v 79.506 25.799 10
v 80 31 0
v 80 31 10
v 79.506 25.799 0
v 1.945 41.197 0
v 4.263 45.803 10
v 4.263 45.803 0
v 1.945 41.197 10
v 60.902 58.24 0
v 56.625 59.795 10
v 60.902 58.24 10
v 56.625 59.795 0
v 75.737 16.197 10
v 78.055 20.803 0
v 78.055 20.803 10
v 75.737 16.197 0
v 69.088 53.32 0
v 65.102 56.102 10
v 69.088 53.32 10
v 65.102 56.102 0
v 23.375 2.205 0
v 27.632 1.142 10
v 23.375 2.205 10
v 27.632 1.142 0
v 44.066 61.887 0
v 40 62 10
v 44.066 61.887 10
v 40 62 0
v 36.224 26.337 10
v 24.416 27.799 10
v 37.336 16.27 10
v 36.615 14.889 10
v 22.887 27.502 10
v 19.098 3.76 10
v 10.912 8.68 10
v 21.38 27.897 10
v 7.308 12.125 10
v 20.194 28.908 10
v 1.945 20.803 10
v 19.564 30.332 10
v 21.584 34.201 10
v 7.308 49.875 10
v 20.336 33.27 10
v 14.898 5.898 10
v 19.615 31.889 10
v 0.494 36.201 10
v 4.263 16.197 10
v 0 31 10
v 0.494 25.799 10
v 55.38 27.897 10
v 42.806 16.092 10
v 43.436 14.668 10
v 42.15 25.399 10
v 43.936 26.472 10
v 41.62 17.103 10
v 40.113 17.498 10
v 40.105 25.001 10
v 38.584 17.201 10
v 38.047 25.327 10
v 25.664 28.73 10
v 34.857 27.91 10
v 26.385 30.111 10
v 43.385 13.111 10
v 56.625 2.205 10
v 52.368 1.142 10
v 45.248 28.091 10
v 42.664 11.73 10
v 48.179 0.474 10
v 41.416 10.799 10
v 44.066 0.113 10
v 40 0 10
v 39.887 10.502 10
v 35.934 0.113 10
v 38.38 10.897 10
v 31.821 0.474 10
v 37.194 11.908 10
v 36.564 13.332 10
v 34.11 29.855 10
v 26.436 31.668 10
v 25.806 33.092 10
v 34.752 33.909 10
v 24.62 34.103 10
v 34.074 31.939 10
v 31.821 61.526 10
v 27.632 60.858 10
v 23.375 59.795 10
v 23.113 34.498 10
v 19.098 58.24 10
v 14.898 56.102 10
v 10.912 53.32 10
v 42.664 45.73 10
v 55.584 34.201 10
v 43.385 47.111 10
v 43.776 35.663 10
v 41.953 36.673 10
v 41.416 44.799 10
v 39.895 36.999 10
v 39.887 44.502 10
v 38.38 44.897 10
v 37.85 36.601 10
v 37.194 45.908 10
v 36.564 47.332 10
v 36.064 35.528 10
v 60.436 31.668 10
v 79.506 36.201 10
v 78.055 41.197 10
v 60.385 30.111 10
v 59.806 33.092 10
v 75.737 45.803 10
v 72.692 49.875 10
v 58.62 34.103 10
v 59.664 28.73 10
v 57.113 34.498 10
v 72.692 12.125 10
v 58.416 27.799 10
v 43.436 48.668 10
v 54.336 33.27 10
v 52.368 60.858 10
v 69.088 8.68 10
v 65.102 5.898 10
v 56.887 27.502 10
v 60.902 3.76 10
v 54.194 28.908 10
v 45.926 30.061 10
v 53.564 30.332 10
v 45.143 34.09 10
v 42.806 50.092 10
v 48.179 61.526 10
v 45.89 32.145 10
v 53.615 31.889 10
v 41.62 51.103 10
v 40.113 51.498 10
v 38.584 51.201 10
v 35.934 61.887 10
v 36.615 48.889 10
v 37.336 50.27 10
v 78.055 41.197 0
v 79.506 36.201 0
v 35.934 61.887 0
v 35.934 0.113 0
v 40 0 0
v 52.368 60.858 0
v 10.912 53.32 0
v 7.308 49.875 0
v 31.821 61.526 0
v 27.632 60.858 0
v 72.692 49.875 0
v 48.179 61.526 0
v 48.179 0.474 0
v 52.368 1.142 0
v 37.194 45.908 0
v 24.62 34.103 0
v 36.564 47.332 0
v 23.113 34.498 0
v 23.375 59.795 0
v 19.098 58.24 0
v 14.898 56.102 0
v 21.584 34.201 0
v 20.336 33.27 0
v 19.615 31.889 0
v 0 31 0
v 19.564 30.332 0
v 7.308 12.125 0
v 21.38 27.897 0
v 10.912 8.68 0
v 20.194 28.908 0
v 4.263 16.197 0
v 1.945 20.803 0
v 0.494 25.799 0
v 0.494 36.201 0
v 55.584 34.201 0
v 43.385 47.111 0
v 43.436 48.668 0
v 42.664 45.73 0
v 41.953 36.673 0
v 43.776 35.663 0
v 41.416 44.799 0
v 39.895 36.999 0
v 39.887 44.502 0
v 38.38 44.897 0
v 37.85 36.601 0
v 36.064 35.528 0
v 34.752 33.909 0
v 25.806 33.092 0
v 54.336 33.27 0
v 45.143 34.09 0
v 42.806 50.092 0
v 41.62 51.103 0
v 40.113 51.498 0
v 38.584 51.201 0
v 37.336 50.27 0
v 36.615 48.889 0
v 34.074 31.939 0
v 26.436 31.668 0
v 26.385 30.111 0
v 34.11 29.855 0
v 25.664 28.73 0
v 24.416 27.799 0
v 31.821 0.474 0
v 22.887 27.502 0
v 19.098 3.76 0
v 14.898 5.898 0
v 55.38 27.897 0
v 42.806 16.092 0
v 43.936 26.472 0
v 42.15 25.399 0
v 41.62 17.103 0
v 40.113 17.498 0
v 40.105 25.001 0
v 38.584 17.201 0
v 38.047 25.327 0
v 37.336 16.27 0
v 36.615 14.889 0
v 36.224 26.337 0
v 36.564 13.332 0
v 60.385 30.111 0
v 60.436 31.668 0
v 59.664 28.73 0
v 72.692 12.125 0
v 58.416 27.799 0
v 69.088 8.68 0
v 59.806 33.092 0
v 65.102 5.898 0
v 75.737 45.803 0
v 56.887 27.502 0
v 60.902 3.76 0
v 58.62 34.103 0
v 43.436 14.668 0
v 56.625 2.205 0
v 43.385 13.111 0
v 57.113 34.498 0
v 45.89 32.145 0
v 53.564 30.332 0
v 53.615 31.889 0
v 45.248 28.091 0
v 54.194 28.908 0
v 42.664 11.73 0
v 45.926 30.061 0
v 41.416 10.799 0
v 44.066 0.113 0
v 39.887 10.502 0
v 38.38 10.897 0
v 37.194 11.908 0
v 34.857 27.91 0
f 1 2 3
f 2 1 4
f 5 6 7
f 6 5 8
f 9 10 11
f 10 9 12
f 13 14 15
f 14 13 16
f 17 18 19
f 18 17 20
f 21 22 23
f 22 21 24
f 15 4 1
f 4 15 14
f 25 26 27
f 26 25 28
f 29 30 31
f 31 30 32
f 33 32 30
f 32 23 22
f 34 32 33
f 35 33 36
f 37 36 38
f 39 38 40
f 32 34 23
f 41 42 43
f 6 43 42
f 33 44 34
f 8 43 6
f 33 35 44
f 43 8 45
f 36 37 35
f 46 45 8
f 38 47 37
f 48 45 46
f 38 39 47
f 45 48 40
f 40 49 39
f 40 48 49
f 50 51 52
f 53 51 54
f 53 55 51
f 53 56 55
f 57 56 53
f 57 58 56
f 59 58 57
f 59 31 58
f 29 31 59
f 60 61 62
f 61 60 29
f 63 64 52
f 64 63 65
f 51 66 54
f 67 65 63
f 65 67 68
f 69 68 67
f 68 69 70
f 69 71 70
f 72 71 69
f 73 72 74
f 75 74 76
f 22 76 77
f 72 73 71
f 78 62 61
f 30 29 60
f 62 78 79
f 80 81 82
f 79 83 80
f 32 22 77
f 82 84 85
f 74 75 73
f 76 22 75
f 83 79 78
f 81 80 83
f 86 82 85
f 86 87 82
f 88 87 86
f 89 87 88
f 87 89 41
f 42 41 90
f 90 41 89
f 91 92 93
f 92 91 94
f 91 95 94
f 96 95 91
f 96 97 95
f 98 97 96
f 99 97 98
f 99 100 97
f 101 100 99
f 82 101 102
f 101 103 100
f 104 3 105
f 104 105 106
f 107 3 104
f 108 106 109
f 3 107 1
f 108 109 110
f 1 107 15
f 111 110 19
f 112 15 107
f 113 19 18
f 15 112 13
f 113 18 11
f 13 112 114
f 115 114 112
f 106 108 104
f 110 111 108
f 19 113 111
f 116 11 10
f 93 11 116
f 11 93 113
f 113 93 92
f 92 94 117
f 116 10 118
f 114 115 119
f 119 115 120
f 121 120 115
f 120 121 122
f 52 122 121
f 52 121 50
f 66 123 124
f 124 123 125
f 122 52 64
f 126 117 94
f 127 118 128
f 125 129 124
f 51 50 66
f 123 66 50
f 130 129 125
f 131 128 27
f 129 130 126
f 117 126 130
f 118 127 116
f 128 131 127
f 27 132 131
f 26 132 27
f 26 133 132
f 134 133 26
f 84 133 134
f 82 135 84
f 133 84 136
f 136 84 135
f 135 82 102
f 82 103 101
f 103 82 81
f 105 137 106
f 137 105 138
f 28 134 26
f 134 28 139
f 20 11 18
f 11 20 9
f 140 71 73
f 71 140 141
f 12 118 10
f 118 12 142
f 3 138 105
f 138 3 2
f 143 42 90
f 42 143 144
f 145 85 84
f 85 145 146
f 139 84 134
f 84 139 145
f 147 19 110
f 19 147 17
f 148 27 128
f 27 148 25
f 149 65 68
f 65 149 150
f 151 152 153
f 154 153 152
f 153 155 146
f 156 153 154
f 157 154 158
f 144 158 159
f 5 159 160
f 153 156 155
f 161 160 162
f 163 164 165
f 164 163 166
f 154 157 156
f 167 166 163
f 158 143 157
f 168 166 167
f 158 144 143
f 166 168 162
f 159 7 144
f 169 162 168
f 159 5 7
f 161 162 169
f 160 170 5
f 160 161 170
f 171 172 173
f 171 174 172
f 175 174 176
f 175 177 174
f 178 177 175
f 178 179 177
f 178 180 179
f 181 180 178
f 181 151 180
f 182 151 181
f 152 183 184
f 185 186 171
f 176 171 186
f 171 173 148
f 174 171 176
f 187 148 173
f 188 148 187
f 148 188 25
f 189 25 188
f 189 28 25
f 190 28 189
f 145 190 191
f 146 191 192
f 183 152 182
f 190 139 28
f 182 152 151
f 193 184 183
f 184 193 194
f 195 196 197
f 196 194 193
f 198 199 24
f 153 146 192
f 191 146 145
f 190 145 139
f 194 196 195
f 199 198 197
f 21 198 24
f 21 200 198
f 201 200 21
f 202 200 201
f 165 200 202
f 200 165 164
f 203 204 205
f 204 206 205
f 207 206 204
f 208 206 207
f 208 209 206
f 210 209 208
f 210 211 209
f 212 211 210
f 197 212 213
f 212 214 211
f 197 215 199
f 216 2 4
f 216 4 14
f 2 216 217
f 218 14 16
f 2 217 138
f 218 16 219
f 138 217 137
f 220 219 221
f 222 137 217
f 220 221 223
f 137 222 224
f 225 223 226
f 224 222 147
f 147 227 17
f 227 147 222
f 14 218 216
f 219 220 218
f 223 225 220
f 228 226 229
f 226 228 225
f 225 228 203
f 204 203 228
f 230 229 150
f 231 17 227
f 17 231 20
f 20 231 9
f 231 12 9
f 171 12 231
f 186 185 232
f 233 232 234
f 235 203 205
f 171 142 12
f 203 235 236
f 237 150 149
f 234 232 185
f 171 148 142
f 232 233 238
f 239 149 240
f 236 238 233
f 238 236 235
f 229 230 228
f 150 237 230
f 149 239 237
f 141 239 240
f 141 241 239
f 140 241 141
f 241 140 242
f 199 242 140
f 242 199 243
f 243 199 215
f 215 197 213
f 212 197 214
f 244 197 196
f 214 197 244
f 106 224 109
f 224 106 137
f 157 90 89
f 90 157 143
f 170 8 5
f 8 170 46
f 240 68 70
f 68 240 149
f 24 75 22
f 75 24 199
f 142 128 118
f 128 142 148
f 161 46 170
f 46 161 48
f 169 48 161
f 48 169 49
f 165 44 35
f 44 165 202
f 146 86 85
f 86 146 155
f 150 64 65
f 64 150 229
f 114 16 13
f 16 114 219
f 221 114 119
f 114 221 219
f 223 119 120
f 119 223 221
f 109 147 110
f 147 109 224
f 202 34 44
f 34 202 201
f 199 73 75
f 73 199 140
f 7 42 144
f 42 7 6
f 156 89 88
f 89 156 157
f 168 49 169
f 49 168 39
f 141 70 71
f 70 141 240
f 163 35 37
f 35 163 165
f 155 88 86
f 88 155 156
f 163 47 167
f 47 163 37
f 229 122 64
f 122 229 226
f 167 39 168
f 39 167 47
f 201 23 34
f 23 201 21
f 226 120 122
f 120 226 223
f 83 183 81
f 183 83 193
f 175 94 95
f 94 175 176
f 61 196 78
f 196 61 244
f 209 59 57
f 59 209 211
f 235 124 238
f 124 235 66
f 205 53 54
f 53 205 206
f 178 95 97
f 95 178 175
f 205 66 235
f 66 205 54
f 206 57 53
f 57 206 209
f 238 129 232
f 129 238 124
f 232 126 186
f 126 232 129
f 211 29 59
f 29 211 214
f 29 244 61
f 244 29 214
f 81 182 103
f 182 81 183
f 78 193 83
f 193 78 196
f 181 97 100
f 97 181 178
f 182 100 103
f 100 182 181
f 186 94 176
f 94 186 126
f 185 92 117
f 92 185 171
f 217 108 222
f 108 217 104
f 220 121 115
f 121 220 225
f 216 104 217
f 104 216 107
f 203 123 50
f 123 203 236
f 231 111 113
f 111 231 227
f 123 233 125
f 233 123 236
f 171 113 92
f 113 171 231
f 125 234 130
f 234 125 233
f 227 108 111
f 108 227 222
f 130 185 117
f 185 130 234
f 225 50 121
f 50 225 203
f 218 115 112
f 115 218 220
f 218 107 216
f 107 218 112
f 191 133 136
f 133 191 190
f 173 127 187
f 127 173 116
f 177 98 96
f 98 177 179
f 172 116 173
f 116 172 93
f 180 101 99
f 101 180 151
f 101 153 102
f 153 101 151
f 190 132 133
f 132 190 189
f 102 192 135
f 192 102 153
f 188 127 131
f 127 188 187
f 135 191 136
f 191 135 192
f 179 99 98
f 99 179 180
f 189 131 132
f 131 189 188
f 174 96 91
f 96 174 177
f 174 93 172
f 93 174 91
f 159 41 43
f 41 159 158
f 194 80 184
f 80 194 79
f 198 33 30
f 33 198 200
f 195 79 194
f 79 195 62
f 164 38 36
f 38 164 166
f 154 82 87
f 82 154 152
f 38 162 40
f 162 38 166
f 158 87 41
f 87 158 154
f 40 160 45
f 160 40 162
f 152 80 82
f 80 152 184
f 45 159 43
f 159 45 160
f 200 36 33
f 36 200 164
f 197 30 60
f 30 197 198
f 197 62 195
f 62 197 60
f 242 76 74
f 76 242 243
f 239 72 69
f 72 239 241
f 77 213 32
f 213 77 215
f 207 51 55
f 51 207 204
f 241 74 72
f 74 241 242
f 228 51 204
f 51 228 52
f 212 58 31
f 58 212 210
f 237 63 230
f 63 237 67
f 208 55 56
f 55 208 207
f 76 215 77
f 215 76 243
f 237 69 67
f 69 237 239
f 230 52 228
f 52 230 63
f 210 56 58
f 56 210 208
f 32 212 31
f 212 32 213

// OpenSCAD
$fn = 32;

// ----------------------------------------------------------------------
// Cam plate: double_lobe cam, base R28
// ----------------------------------------------------------------------

// --- parameters (mm) ---
base_r = 28;              // base circle radius
lobe_h = 12;              // cam lobe rise
bore_r = 6;               // shaft bore radius
plate_t = 10;             // plate thickness, Z (extrusion height)
ring_r = 17;              // lightening ring radius
bolt_r = 3.5;             // lightening hole radius

profile = [[80, 31], [79.506, 36.201], [78.055, 41.197], [75.737, 45.803], [72.692, 49.875], [69.088, 53.32], [65.102, 56.102], [60.902, 58.24], [56.625, 59.795], [52.368, 60.858], [48.179, 61.526], [44.066, 61.887], [40, 62], [35.934, 61.887], [31.821, 61.526], [27.632, 60.858], [23.375, 59.795], [19.098, 58.24], [14.898, 56.102], [10.912, 53.32], [7.308, 49.875], [4.263, 45.803], [1.945, 41.197], [0.494, 36.201], [0, 31], [0.494, 25.799], [1.945, 20.803], [4.263, 16.197], [7.308, 12.125], [10.912, 8.68], [14.898, 5.898], [19.098, 3.76], [23.375, 2.205], [27.632, 1.142], [31.821, 0.474], [35.934, 0.113], [40, 0], [44.066, 0.113], [48.179, 0.474], [52.368, 1.142], [56.625, 2.205], [60.902, 3.76], [65.102, 5.898], [69.088, 8.68], [72.692, 12.125], [75.737, 16.197], [78.055, 20.803], [79.506, 25.799]];  // primary outline, 48 points, counter clockwise
void_1 = [[45.89, 32.145], [45.143, 34.09], [43.776, 35.663], [41.953, 36.673], [39.895, 36.999], [37.85, 36.601], [36.064, 35.528], [34.752, 33.909], [34.074, 31.939], [34.11, 29.855], [34.857, 27.91], [36.224, 26.337], [38.047, 25.327], [40.105, 25.001], [42.15, 25.399], [43.936, 26.472], [45.248, 28.091], [45.926, 30.061]];  // shaft bore, 18 points
void_2 = [[60.436, 31.668], [59.806, 33.092], [58.62, 34.103], [57.113, 34.498], [55.584, 34.201], [54.336, 33.27], [53.615, 31.889], [53.564, 30.332], [54.194, 28.908], [55.38, 27.897], [56.887, 27.502], [58.416, 27.799], [59.664, 28.73], [60.385, 30.111]];  // lightening hole 1, 14 points
void_3 = [[43.436, 48.668], [42.806, 50.092], [41.62, 51.103], [40.113, 51.498], [38.584, 51.201], [37.336, 50.27], [36.615, 48.889], [36.564, 47.332], [37.194, 45.908], [38.38, 44.897], [39.887, 44.502], [41.416, 44.799], [42.664, 45.73], [43.385, 47.111]];  // lightening hole 2, 14 points
void_4 = [[26.436, 31.668], [25.806, 33.092], [24.62, 34.103], [23.113, 34.498], [21.584, 34.201], [20.336, 33.27], [19.615, 31.889], [19.564, 30.332], [20.194, 28.908], [21.38, 27.897], [22.887, 27.502], [24.416, 27.799], [25.664, 28.73], [26.385, 30.111]];  // lightening hole 3, 14 points
void_5 = [[43.436, 14.668], [42.806, 16.092], [41.62, 17.103], [40.113, 17.498], [38.584, 17.201], [37.336, 16.27], [36.615, 14.889], [36.564, 13.332], [37.194, 11.908], [38.38, 10.897], [39.887, 10.502], [41.416, 10.799], [42.664, 11.73], [43.385, 13.111]];  // lightening hole 4, 14 points

// --- the one profile operation ---
difference() {
  linear_extrude(height = plate_t) polygon(points = profile);
  translate([0, 0, -1])
    linear_extrude(height = plate_t + 2) polygon(points = void_1);
  translate([0, 0, -1])
    linear_extrude(height = plate_t + 2) polygon(points = void_2);
  translate([0, 0, -1])
    linear_extrude(height = plate_t + 2) polygon(points = void_3);
  translate([0, 0, -1])
    linear_extrude(height = plate_t + 2) polygon(points = void_4);
  translate([0, 0, -1])
    linear_extrude(height = plate_t + 2) polygon(points = void_5);
}
